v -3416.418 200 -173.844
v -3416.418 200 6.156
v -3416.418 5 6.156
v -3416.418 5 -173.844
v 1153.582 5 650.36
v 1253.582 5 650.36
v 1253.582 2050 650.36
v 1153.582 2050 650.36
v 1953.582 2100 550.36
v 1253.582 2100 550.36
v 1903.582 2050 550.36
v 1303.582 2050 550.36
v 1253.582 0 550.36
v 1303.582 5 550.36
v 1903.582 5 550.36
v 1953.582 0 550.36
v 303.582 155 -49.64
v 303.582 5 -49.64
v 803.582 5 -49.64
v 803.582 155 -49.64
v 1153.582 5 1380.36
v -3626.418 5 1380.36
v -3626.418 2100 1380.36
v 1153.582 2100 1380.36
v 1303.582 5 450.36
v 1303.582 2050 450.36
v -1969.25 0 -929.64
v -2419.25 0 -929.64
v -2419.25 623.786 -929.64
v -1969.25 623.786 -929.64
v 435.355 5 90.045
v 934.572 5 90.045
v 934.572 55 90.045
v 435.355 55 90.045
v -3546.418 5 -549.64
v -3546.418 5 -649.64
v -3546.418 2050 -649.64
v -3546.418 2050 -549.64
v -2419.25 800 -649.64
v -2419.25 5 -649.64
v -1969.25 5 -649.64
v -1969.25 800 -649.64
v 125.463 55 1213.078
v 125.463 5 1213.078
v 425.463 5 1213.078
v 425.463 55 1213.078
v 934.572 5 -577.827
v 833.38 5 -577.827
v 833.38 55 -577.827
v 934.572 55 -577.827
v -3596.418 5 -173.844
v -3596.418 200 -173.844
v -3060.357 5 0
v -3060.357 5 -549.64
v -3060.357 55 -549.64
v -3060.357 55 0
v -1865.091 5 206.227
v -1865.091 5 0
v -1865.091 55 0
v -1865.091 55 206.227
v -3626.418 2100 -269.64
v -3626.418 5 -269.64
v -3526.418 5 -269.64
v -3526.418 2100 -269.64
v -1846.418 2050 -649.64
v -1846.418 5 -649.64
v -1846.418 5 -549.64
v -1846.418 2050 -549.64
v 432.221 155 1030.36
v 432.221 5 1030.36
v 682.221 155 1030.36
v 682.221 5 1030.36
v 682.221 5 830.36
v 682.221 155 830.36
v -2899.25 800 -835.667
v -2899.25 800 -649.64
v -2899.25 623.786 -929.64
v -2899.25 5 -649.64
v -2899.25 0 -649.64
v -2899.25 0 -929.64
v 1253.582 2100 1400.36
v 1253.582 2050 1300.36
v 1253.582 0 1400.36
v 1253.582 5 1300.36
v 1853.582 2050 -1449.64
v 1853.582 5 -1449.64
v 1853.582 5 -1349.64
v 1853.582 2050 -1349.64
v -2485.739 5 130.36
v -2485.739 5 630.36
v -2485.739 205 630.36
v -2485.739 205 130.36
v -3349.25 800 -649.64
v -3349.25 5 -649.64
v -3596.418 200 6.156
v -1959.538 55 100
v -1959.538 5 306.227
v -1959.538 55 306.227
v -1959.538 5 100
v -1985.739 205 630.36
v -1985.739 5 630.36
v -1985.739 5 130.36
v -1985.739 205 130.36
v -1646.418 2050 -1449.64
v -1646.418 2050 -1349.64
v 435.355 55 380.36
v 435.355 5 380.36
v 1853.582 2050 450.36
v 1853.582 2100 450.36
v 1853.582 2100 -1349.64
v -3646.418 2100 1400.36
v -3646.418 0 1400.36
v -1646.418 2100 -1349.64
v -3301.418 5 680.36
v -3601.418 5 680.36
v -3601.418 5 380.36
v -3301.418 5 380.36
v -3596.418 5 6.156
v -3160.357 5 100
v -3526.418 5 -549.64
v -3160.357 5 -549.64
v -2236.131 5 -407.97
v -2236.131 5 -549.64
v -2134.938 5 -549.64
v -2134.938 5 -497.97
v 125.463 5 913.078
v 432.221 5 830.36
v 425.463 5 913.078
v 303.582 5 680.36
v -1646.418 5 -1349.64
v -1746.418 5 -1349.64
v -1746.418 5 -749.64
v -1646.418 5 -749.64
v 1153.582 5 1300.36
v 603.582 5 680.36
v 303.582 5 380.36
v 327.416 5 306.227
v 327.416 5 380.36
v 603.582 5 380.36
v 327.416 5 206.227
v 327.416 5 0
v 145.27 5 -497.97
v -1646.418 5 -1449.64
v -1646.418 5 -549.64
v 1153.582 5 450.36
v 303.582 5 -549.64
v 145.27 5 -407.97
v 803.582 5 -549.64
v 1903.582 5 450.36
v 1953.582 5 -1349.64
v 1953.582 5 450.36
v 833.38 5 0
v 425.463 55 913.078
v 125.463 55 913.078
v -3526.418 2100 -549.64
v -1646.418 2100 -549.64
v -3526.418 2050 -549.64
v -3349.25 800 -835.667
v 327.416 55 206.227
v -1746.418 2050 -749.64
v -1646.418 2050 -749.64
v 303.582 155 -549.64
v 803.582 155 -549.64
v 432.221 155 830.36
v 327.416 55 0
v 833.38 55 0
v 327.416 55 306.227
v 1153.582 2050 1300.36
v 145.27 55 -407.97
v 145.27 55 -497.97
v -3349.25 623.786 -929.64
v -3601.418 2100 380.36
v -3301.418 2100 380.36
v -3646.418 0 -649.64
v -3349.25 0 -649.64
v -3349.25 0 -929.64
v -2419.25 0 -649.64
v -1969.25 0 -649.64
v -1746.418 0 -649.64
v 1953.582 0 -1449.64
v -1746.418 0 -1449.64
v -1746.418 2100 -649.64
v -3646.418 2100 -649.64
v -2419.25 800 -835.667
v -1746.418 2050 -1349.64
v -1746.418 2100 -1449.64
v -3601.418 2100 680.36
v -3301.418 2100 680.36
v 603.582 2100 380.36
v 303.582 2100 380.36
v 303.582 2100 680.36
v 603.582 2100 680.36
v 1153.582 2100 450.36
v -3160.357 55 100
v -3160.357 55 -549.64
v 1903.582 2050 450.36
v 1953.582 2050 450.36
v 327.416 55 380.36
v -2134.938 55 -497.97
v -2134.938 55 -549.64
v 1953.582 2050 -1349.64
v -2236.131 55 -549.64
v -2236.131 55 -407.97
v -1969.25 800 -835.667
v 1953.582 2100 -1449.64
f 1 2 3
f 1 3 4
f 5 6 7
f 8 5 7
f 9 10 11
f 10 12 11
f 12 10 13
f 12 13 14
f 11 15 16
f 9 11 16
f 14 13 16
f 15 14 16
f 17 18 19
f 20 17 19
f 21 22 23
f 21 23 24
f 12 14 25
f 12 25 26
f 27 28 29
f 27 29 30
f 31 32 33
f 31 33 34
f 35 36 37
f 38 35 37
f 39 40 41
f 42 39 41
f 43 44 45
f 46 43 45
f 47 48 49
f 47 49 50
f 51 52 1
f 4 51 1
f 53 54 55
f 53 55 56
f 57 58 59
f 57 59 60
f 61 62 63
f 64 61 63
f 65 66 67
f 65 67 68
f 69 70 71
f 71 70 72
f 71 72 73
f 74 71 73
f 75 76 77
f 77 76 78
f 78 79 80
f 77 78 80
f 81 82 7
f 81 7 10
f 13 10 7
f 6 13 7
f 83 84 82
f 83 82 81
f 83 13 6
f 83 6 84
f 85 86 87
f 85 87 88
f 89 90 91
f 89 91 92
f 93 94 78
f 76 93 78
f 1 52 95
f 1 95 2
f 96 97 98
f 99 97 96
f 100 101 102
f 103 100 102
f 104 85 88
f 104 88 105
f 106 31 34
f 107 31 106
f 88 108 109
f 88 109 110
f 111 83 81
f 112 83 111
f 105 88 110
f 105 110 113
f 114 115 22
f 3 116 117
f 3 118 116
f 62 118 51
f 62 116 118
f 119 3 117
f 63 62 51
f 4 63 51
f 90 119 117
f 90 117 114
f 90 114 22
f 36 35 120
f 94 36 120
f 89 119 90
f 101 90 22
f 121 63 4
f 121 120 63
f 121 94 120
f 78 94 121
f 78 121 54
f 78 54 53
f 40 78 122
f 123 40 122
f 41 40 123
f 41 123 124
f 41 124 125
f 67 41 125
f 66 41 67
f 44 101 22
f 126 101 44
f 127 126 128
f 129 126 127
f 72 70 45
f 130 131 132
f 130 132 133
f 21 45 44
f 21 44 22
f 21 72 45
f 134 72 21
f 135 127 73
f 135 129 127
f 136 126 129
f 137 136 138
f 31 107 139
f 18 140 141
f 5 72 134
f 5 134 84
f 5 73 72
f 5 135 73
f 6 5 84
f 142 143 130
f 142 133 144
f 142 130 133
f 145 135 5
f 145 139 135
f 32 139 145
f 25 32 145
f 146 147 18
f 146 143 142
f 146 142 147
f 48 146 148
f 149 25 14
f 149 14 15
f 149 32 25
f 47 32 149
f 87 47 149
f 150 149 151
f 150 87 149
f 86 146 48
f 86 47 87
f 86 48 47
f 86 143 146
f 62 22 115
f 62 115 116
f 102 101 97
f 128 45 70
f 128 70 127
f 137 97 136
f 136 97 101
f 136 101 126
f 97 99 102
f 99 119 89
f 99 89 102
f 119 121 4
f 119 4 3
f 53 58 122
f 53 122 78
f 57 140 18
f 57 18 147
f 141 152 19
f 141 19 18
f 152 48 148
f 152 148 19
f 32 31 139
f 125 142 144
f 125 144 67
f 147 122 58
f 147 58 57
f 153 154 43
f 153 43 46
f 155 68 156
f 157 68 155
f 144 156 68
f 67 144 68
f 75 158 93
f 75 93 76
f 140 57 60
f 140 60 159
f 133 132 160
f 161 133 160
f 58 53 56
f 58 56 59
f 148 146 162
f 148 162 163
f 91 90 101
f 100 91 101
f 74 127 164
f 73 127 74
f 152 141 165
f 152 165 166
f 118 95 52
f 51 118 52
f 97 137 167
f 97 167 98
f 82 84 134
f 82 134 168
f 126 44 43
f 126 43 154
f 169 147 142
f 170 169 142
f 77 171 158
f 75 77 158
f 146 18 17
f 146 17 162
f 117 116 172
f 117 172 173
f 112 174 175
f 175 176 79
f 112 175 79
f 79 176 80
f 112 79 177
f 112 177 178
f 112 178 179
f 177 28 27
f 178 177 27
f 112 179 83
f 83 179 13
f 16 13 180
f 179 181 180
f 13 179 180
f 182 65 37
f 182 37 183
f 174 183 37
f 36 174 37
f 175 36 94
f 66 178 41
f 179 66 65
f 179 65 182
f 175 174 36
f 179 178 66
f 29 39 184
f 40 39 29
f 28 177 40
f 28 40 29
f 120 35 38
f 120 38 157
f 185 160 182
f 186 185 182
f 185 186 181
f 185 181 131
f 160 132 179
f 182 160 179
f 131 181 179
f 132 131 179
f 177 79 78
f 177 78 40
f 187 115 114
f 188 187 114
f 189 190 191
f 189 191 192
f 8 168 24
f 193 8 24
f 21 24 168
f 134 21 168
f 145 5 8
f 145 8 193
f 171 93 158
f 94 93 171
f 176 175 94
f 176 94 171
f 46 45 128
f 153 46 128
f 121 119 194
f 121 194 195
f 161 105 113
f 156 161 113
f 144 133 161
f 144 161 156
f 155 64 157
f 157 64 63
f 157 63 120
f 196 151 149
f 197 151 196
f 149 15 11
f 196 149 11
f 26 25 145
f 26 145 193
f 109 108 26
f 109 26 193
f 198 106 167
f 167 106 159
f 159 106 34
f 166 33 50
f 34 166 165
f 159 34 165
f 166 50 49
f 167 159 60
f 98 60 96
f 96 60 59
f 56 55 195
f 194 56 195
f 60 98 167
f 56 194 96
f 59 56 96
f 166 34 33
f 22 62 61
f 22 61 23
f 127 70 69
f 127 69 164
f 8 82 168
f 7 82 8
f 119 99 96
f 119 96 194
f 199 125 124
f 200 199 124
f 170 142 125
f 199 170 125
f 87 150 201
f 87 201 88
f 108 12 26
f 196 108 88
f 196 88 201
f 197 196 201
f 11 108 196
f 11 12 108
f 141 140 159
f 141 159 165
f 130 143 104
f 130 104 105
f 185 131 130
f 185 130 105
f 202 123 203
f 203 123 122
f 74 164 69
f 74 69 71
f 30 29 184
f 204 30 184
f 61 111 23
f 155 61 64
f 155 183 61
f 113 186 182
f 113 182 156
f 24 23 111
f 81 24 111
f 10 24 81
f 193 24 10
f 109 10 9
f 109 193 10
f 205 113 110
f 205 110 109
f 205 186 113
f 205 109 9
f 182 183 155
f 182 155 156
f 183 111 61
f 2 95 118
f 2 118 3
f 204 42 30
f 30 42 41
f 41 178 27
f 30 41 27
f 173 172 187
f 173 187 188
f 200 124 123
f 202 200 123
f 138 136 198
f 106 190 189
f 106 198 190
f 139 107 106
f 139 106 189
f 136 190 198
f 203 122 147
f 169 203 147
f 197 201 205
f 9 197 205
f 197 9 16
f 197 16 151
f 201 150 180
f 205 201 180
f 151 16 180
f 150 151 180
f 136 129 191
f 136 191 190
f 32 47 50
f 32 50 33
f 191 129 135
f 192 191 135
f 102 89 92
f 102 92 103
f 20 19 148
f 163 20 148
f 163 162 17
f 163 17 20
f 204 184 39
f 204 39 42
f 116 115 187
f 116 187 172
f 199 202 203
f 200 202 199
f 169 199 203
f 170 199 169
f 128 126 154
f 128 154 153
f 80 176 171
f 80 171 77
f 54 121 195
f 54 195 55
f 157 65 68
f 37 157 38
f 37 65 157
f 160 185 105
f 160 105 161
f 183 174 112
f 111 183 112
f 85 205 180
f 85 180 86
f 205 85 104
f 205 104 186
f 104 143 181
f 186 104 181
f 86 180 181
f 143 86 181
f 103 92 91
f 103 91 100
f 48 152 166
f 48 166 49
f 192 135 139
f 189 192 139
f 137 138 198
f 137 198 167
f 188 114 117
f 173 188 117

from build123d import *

# Parameters (mm, degrees)
SALIENTE_EXTRUIR1_DEPTH   = 2100
CROQUIS1_W                = 300
CROQUIS1_H                = 300
SALIENTE_EXTRUIR1_2_DEPTH = 2100
CROQUIS3_W                = 300
CROQUIS3_H                = 300
SALIENTE_EXTRUIR2_DEPTH   = 2100
CROQUIS3_W_2              = 100
CROQUIS3_H_2              = 280
SALIENTE_EXTRUIR2_2_DEPTH = 2100
CROQUIS4_W                = 180
CROQUIS4_H                = 180
SALIENTE_EXTRUIR3_DEPTH   = 200
CROQUIS6_W                = 1800
CROQUIS6_H                = 2050
CORTAR_EXTRUIR1_DEPTH     = 100
CROQUIS7_W                = 600
CROQUIS7_H                = 2050
CORTAR_EXTRUIR2_DEPTH     = 100
CROQUIS8_W                = 3500
CROQUIS8_H                = 2050
CORTAR_EXTRUIR3_DEPTH     = 100
CROQUIS9_W                = 650
CROQUIS9_H                = 2050
CORTAR_EXTRUIR4_DEPTH     = 100
CROQUIS10_W               = 600
CROQUIS10_H               = 2050
CORTAR_EXTRUIR5_DEPTH     = 100
CROQUIS11_W               = 1700
CROQUIS11_H               = 2050
CORTAR_EXTRUIR6_DEPTH     = 100
SALIENTE_EXTRUIR5_DEPTH   = 5
CROQUIS13_W               = 500
CROQUIS13_H               = 500
SALIENTE_EXTRUIR6_DEPTH   = 150
CROQUIS14_W               = 500
CROQUIS14_H               = 500
SALIENTE_EXTRUIR7_DEPTH   = 200
CROQUIS15_W               = 450
CROQUIS15_H               = 280
SALIENTE_EXTRUIR8_DEPTH   = 800
CORTAR_EXTRUIR7_REACH     = 5886.852
SALIENTE_EXTRUIR11_DEPTH  = 50
SALIENTE_EXTRUIR12_DEPTH  = 50
SALIENTE_EXTRUIR13_DEPTH  = 50
CROQUIS22_W               = 250
CROQUIS22_H               = 200
SALIENTE_EXTRUIR14_DEPTH  = 150
CROQUIS23_W               = 300
CROQUIS23_H               = 300
SALIENTE_EXTRUIR15_DEPTH  = 50


with BuildPart() as part:
    # Croquis1 → Saliente-Extruir1 (new body)
    with BuildSketch(Plane(origin=(0, 0, 0), x_dir=(1, 0, 0), z_dir=(0, 1, 0))):
        Polygon((1253.581591405, -550.359833019), (1253.581591405, -1400.359833019), (-3646.418408595, -1400.359833019), (-3646.418408595, -250.359833019), (-3646.418408595, 649.640166981), (-1746.418408595, 649.640166981), (-1746.418408595, 1449.640166981), (1953.581591405, 1449.640166981), (1953.581591405, -550.359833019), align=None)
        Polygon((-1646.418408595, 549.640166981), (-3626.418408595, 549.640166981), (-3626.418408595, -1380.359833019), (1153.581591405, -1380.359833019), (1153.581591405, -450.359833019), (1853.581591405, -450.359833019), (1853.581591405, 1349.640166981), (-1646.418408595, 1349.640166981), align=None, mode=Mode.SUBTRACT)
    extrude(amount=SALIENTE_EXTRUIR1_DEPTH)

    # Croquis6 → Cortar-Extruir1 (cut)
    with BuildSketch(Plane(origin=(1953.581591405, 0, 0), x_dir=(0, 0, -1), z_dir=(1, 0, 0))):
        with Locations((449.640166981, 1025)):
            Rectangle(CROQUIS6_W, CROQUIS6_H)
    extrude(amount=-CORTAR_EXTRUIR1_DEPTH, mode=Mode.SUBTRACT)

    # Croquis7 → Cortar-Extruir2 (cut)
    with BuildSketch(Plane.XY.offset(550.359833019)):
        with Locations((1603.581591405, 1025)):
            Rectangle(CROQUIS7_W, CROQUIS7_H)
    extrude(amount=-CORTAR_EXTRUIR2_DEPTH, mode=Mode.SUBTRACT)

    # Croquis8 → Cortar-Extruir3 (cut)
    with BuildSketch(Plane(origin=(0, 0, -1449.640166981), x_dir=(-1, 0, 0), z_dir=(0, 0, -1))):
        with Locations((-103.581591405, 1025)):
            Rectangle(CROQUIS8_W, CROQUIS8_H)
    extrude(amount=-CORTAR_EXTRUIR3_DEPTH, mode=Mode.SUBTRACT)

    # Croquis9 → Cortar-Extruir4 (cut)
    with BuildSketch(Plane(origin=(1253.581591405, 0, 0), x_dir=(0, 0, -1), z_dir=(1, 0, 0))):
        with Locations((-975.359833019, 1025)):
            Rectangle(CROQUIS9_W, CROQUIS9_H)
    extrude(amount=-CORTAR_EXTRUIR4_DEPTH, mode=Mode.SUBTRACT)

    # Croquis10 → Cortar-Extruir5 (cut)
    with BuildSketch(Plane.ZY.offset(1746.418408595)):
        with Locations((-1049.640166981, 1025)):
            Rectangle(CROQUIS10_W, CROQUIS10_H)
    extrude(amount=-CORTAR_EXTRUIR5_DEPTH, mode=Mode.SUBTRACT)

    # Croquis11 → Cortar-Extruir6 (cut)
    with BuildSketch(Plane(origin=(0, 0, -649.640166981), x_dir=(-1, 0, 0), z_dir=(0, 0, -1))):
        with Locations((2696.418408595, 1025)):
            Rectangle(CROQUIS11_W, CROQUIS11_H)
    extrude(amount=-CORTAR_EXTRUIR6_DEPTH, mode=Mode.SUBTRACT)



with BuildPart() as body_2:
    # Croquis1 → Saliente-Extruir1 2 (new body)
    with BuildSketch(Plane(origin=(0, 0, 0), x_dir=(1, 0, 0), z_dir=(0, 1, 0))):
        with Locations((453.581591405, -530.359833019)):
            Rectangle(CROQUIS1_W, CROQUIS1_H)
    extrude(amount=SALIENTE_EXTRUIR1_2_DEPTH)


with BuildPart() as body_3:
    # Croquis3 → Saliente-Extruir2 (new body)
    with BuildSketch(Plane(origin=(0, 0, 0), x_dir=(1, 0, 0), z_dir=(0, 1, 0))):
        with Locations((-3451.418408595, -530.359833019)):
            Rectangle(CROQUIS3_W, CROQUIS3_H)
    extrude(amount=SALIENTE_EXTRUIR2_DEPTH)


with BuildPart() as body_4:
    # Croquis3 → Saliente-Extruir2 2 (new body)
    with BuildSketch(Plane(origin=(0, 0, 0), x_dir=(1, 0, 0), z_dir=(0, 1, 0))):
        with Locations((-3576.418408595, 409.640166981)):
            Rectangle(CROQUIS3_W_2, CROQUIS3_H_2)
    extrude(amount=SALIENTE_EXTRUIR2_2_DEPTH)


with BuildPart() as body_5:
    # Croquis4 → Saliente-Extruir3 (new body)
    with BuildSketch(Plane(origin=(0, 0, 0), x_dir=(1, 0, 0), z_dir=(0, 1, 0))):
        with Locations((-3506.418408595, 83.843678965)):
            Rectangle(CROQUIS4_W, CROQUIS4_H)
    extrude(amount=SALIENTE_EXTRUIR3_DEPTH)


with BuildPart() as part_1:
    add(part.part)

    add(body_2.part)  # Saliente-Extruir5 merges body 2

    add(body_3.part)  # Saliente-Extruir5 merges body 3

    add(body_4.part)  # Saliente-Extruir5 merges body 4

    add(body_5.part)  # Saliente-Extruir5 merges body 5
    # Croquis12 → Saliente-Extruir5 (add)
    with BuildSketch(Plane(origin=(0, 0, 0), x_dir=(1, 0, 0), z_dir=(0, 1, 0))):
        Polygon((-3646.418408595, 649.640166981), (-3646.418408595, -1400.359833019), (1253.581591405, -1400.359833019), (1253.581591405, -550.359833019), (1953.581591405, -550.359833019), (1953.581591405, 1449.640166981), (-1746.418408595, 1449.640166981), (-1746.418408595, 649.640166981), align=None)
    extrude(amount=SALIENTE_EXTRUIR5_DEPTH)

    # Croquis13 → Saliente-Extruir6 (add)
    with BuildSketch(Plane(origin=(0, 5, 0), x_dir=(1, 0, 0), z_dir=(0, 1, 0))):
        with Locations((553.581591405, 299.640166981)):
            Rectangle(CROQUIS13_W, CROQUIS13_H)
    extrude(amount=SALIENTE_EXTRUIR6_DEPTH)

    # Croquis14 → Saliente-Extruir7 (add)
    with BuildSketch(Plane(origin=(0, 5, 0), x_dir=(1, 0, 0), z_dir=(0, 1, 0))):
        with Locations((-2235.739490602, -380.359833019)):
            Rectangle(CROQUIS14_W, CROQUIS14_H)
    extrude(amount=SALIENTE_EXTRUIR7_DEPTH)

    # Croquis15 → Saliente-Extruir8 (add)
    with BuildSketch(Plane(origin=(0, 0, 0), x_dir=(1, 0, 0), z_dir=(0, 1, 0))):
        with Locations((-3124.250184005, 789.640166981)):
            Rectangle(CROQUIS15_W, CROQUIS15_H)
        with Locations((-2194.250184005, 789.640166981)):
            Rectangle(CROQUIS15_W, CROQUIS15_H)
    extrude(amount=SALIENTE_EXTRUIR8_DEPTH)

    # Cortar-Extruir7: up to this face of the body (flat: up to its plane)
    cortar_extruir7_end = Plane(part_1.part.faces().sort_by_distance((-1969.250184005, 400, -789.640166981))[0])
    # Croquis16 → Cortar-Extruir7 (cut, up to the picked face)
    with BuildSketch(Plane.ZY.offset(3349.250184005), mode=Mode.PRIVATE) as cortar_extruir7_sk1:
        Polygon((-929.640166981, 623.785690967), (-835.666652808, 800), (-929.640166981, 800), align=None)
    cortar_extruir7_tool1 = split(extrude(cortar_extruir7_sk1.sketch, amount=-CORTAR_EXTRUIR7_REACH, mode=Mode.PRIVATE), bisect_by=cortar_extruir7_end, keep=Keep.BOTH, mode=Mode.PRIVATE)
    add(cortar_extruir7_tool1.solids().sort_by(Axis((-3349.250184, 741.261897, -898.315662), (1, 0, 0)))[0], mode=Mode.SUBTRACT)

    # Croquis19 → Saliente-Extruir11 (add)
    with BuildSketch(Plane(origin=(0, 5, 0), x_dir=(1, 0, 0), z_dir=(0, 1, 0))):
        Polygon((327.416440249, -380.359833019), (327.416440249, 0), (833.379737165, 0), (833.379737165, 577.826704942), (934.572396548, 577.826704942), (934.572396548, -90.044846986), (435.355276925, -90.044846986), (435.355276925, -380.359833019), align=None)
    extrude(amount=SALIENTE_EXTRUIR11_DEPTH)

    # Croquis20 → Saliente-Extruir12 (add)
    with BuildSketch(Plane(origin=(0, 5, 0), x_dir=(1, 0, 0), z_dir=(0, 1, 0))):
        Polygon((-2236.13093079, 549.640166981), (-2236.13093079, 407.970443845), (145.26965336, 407.970443845), (145.26965336, 497.970443845), (-2134.938271407, 497.970443845), (-2134.938271407, 549.640166981), align=None)
    extrude(amount=SALIENTE_EXTRUIR12_DEPTH)

    # Croquis21 → Saliente-Extruir13 (add)
    with BuildSketch(Plane(origin=(0, 5, 0), x_dir=(1, 0, 0), z_dir=(0, 1, 0))):
        Polygon((327.416440249, -306.227432097), (-1959.53766181, -306.227432097), (-1959.53766181, -100), (-3160.357219823, -100), (-3160.357219823, 549.640166981), (-3060.357219823, 549.640166981), (-3060.357219823, 0), (-1865.091179719, 0), (-1865.091179719, -206.227432097), (327.416440249, -206.227432097), align=None)
    extrude(amount=SALIENTE_EXTRUIR13_DEPTH)

    # Croquis22 → Saliente-Extruir14 (add)
    with BuildSketch(Plane(origin=(0, 5, 0), x_dir=(1, 0, 0), z_dir=(0, 1, 0))):
        with Locations((557.221387347, -930.359833019)):
            Rectangle(CROQUIS22_W, CROQUIS22_H)
    extrude(amount=SALIENTE_EXTRUIR14_DEPTH)

    # Croquis23 → Saliente-Extruir15 (add)
    with BuildSketch(Plane(origin=(0, 5, 0), x_dir=(1, 0, 0), z_dir=(0, 1, 0))):
        with Locations((275.462852563, -1063.078476636)):
            Rectangle(CROQUIS23_W, CROQUIS23_H)
    extrude(amount=SALIENTE_EXTRUIR15_DEPTH)


solid = part_1.part
